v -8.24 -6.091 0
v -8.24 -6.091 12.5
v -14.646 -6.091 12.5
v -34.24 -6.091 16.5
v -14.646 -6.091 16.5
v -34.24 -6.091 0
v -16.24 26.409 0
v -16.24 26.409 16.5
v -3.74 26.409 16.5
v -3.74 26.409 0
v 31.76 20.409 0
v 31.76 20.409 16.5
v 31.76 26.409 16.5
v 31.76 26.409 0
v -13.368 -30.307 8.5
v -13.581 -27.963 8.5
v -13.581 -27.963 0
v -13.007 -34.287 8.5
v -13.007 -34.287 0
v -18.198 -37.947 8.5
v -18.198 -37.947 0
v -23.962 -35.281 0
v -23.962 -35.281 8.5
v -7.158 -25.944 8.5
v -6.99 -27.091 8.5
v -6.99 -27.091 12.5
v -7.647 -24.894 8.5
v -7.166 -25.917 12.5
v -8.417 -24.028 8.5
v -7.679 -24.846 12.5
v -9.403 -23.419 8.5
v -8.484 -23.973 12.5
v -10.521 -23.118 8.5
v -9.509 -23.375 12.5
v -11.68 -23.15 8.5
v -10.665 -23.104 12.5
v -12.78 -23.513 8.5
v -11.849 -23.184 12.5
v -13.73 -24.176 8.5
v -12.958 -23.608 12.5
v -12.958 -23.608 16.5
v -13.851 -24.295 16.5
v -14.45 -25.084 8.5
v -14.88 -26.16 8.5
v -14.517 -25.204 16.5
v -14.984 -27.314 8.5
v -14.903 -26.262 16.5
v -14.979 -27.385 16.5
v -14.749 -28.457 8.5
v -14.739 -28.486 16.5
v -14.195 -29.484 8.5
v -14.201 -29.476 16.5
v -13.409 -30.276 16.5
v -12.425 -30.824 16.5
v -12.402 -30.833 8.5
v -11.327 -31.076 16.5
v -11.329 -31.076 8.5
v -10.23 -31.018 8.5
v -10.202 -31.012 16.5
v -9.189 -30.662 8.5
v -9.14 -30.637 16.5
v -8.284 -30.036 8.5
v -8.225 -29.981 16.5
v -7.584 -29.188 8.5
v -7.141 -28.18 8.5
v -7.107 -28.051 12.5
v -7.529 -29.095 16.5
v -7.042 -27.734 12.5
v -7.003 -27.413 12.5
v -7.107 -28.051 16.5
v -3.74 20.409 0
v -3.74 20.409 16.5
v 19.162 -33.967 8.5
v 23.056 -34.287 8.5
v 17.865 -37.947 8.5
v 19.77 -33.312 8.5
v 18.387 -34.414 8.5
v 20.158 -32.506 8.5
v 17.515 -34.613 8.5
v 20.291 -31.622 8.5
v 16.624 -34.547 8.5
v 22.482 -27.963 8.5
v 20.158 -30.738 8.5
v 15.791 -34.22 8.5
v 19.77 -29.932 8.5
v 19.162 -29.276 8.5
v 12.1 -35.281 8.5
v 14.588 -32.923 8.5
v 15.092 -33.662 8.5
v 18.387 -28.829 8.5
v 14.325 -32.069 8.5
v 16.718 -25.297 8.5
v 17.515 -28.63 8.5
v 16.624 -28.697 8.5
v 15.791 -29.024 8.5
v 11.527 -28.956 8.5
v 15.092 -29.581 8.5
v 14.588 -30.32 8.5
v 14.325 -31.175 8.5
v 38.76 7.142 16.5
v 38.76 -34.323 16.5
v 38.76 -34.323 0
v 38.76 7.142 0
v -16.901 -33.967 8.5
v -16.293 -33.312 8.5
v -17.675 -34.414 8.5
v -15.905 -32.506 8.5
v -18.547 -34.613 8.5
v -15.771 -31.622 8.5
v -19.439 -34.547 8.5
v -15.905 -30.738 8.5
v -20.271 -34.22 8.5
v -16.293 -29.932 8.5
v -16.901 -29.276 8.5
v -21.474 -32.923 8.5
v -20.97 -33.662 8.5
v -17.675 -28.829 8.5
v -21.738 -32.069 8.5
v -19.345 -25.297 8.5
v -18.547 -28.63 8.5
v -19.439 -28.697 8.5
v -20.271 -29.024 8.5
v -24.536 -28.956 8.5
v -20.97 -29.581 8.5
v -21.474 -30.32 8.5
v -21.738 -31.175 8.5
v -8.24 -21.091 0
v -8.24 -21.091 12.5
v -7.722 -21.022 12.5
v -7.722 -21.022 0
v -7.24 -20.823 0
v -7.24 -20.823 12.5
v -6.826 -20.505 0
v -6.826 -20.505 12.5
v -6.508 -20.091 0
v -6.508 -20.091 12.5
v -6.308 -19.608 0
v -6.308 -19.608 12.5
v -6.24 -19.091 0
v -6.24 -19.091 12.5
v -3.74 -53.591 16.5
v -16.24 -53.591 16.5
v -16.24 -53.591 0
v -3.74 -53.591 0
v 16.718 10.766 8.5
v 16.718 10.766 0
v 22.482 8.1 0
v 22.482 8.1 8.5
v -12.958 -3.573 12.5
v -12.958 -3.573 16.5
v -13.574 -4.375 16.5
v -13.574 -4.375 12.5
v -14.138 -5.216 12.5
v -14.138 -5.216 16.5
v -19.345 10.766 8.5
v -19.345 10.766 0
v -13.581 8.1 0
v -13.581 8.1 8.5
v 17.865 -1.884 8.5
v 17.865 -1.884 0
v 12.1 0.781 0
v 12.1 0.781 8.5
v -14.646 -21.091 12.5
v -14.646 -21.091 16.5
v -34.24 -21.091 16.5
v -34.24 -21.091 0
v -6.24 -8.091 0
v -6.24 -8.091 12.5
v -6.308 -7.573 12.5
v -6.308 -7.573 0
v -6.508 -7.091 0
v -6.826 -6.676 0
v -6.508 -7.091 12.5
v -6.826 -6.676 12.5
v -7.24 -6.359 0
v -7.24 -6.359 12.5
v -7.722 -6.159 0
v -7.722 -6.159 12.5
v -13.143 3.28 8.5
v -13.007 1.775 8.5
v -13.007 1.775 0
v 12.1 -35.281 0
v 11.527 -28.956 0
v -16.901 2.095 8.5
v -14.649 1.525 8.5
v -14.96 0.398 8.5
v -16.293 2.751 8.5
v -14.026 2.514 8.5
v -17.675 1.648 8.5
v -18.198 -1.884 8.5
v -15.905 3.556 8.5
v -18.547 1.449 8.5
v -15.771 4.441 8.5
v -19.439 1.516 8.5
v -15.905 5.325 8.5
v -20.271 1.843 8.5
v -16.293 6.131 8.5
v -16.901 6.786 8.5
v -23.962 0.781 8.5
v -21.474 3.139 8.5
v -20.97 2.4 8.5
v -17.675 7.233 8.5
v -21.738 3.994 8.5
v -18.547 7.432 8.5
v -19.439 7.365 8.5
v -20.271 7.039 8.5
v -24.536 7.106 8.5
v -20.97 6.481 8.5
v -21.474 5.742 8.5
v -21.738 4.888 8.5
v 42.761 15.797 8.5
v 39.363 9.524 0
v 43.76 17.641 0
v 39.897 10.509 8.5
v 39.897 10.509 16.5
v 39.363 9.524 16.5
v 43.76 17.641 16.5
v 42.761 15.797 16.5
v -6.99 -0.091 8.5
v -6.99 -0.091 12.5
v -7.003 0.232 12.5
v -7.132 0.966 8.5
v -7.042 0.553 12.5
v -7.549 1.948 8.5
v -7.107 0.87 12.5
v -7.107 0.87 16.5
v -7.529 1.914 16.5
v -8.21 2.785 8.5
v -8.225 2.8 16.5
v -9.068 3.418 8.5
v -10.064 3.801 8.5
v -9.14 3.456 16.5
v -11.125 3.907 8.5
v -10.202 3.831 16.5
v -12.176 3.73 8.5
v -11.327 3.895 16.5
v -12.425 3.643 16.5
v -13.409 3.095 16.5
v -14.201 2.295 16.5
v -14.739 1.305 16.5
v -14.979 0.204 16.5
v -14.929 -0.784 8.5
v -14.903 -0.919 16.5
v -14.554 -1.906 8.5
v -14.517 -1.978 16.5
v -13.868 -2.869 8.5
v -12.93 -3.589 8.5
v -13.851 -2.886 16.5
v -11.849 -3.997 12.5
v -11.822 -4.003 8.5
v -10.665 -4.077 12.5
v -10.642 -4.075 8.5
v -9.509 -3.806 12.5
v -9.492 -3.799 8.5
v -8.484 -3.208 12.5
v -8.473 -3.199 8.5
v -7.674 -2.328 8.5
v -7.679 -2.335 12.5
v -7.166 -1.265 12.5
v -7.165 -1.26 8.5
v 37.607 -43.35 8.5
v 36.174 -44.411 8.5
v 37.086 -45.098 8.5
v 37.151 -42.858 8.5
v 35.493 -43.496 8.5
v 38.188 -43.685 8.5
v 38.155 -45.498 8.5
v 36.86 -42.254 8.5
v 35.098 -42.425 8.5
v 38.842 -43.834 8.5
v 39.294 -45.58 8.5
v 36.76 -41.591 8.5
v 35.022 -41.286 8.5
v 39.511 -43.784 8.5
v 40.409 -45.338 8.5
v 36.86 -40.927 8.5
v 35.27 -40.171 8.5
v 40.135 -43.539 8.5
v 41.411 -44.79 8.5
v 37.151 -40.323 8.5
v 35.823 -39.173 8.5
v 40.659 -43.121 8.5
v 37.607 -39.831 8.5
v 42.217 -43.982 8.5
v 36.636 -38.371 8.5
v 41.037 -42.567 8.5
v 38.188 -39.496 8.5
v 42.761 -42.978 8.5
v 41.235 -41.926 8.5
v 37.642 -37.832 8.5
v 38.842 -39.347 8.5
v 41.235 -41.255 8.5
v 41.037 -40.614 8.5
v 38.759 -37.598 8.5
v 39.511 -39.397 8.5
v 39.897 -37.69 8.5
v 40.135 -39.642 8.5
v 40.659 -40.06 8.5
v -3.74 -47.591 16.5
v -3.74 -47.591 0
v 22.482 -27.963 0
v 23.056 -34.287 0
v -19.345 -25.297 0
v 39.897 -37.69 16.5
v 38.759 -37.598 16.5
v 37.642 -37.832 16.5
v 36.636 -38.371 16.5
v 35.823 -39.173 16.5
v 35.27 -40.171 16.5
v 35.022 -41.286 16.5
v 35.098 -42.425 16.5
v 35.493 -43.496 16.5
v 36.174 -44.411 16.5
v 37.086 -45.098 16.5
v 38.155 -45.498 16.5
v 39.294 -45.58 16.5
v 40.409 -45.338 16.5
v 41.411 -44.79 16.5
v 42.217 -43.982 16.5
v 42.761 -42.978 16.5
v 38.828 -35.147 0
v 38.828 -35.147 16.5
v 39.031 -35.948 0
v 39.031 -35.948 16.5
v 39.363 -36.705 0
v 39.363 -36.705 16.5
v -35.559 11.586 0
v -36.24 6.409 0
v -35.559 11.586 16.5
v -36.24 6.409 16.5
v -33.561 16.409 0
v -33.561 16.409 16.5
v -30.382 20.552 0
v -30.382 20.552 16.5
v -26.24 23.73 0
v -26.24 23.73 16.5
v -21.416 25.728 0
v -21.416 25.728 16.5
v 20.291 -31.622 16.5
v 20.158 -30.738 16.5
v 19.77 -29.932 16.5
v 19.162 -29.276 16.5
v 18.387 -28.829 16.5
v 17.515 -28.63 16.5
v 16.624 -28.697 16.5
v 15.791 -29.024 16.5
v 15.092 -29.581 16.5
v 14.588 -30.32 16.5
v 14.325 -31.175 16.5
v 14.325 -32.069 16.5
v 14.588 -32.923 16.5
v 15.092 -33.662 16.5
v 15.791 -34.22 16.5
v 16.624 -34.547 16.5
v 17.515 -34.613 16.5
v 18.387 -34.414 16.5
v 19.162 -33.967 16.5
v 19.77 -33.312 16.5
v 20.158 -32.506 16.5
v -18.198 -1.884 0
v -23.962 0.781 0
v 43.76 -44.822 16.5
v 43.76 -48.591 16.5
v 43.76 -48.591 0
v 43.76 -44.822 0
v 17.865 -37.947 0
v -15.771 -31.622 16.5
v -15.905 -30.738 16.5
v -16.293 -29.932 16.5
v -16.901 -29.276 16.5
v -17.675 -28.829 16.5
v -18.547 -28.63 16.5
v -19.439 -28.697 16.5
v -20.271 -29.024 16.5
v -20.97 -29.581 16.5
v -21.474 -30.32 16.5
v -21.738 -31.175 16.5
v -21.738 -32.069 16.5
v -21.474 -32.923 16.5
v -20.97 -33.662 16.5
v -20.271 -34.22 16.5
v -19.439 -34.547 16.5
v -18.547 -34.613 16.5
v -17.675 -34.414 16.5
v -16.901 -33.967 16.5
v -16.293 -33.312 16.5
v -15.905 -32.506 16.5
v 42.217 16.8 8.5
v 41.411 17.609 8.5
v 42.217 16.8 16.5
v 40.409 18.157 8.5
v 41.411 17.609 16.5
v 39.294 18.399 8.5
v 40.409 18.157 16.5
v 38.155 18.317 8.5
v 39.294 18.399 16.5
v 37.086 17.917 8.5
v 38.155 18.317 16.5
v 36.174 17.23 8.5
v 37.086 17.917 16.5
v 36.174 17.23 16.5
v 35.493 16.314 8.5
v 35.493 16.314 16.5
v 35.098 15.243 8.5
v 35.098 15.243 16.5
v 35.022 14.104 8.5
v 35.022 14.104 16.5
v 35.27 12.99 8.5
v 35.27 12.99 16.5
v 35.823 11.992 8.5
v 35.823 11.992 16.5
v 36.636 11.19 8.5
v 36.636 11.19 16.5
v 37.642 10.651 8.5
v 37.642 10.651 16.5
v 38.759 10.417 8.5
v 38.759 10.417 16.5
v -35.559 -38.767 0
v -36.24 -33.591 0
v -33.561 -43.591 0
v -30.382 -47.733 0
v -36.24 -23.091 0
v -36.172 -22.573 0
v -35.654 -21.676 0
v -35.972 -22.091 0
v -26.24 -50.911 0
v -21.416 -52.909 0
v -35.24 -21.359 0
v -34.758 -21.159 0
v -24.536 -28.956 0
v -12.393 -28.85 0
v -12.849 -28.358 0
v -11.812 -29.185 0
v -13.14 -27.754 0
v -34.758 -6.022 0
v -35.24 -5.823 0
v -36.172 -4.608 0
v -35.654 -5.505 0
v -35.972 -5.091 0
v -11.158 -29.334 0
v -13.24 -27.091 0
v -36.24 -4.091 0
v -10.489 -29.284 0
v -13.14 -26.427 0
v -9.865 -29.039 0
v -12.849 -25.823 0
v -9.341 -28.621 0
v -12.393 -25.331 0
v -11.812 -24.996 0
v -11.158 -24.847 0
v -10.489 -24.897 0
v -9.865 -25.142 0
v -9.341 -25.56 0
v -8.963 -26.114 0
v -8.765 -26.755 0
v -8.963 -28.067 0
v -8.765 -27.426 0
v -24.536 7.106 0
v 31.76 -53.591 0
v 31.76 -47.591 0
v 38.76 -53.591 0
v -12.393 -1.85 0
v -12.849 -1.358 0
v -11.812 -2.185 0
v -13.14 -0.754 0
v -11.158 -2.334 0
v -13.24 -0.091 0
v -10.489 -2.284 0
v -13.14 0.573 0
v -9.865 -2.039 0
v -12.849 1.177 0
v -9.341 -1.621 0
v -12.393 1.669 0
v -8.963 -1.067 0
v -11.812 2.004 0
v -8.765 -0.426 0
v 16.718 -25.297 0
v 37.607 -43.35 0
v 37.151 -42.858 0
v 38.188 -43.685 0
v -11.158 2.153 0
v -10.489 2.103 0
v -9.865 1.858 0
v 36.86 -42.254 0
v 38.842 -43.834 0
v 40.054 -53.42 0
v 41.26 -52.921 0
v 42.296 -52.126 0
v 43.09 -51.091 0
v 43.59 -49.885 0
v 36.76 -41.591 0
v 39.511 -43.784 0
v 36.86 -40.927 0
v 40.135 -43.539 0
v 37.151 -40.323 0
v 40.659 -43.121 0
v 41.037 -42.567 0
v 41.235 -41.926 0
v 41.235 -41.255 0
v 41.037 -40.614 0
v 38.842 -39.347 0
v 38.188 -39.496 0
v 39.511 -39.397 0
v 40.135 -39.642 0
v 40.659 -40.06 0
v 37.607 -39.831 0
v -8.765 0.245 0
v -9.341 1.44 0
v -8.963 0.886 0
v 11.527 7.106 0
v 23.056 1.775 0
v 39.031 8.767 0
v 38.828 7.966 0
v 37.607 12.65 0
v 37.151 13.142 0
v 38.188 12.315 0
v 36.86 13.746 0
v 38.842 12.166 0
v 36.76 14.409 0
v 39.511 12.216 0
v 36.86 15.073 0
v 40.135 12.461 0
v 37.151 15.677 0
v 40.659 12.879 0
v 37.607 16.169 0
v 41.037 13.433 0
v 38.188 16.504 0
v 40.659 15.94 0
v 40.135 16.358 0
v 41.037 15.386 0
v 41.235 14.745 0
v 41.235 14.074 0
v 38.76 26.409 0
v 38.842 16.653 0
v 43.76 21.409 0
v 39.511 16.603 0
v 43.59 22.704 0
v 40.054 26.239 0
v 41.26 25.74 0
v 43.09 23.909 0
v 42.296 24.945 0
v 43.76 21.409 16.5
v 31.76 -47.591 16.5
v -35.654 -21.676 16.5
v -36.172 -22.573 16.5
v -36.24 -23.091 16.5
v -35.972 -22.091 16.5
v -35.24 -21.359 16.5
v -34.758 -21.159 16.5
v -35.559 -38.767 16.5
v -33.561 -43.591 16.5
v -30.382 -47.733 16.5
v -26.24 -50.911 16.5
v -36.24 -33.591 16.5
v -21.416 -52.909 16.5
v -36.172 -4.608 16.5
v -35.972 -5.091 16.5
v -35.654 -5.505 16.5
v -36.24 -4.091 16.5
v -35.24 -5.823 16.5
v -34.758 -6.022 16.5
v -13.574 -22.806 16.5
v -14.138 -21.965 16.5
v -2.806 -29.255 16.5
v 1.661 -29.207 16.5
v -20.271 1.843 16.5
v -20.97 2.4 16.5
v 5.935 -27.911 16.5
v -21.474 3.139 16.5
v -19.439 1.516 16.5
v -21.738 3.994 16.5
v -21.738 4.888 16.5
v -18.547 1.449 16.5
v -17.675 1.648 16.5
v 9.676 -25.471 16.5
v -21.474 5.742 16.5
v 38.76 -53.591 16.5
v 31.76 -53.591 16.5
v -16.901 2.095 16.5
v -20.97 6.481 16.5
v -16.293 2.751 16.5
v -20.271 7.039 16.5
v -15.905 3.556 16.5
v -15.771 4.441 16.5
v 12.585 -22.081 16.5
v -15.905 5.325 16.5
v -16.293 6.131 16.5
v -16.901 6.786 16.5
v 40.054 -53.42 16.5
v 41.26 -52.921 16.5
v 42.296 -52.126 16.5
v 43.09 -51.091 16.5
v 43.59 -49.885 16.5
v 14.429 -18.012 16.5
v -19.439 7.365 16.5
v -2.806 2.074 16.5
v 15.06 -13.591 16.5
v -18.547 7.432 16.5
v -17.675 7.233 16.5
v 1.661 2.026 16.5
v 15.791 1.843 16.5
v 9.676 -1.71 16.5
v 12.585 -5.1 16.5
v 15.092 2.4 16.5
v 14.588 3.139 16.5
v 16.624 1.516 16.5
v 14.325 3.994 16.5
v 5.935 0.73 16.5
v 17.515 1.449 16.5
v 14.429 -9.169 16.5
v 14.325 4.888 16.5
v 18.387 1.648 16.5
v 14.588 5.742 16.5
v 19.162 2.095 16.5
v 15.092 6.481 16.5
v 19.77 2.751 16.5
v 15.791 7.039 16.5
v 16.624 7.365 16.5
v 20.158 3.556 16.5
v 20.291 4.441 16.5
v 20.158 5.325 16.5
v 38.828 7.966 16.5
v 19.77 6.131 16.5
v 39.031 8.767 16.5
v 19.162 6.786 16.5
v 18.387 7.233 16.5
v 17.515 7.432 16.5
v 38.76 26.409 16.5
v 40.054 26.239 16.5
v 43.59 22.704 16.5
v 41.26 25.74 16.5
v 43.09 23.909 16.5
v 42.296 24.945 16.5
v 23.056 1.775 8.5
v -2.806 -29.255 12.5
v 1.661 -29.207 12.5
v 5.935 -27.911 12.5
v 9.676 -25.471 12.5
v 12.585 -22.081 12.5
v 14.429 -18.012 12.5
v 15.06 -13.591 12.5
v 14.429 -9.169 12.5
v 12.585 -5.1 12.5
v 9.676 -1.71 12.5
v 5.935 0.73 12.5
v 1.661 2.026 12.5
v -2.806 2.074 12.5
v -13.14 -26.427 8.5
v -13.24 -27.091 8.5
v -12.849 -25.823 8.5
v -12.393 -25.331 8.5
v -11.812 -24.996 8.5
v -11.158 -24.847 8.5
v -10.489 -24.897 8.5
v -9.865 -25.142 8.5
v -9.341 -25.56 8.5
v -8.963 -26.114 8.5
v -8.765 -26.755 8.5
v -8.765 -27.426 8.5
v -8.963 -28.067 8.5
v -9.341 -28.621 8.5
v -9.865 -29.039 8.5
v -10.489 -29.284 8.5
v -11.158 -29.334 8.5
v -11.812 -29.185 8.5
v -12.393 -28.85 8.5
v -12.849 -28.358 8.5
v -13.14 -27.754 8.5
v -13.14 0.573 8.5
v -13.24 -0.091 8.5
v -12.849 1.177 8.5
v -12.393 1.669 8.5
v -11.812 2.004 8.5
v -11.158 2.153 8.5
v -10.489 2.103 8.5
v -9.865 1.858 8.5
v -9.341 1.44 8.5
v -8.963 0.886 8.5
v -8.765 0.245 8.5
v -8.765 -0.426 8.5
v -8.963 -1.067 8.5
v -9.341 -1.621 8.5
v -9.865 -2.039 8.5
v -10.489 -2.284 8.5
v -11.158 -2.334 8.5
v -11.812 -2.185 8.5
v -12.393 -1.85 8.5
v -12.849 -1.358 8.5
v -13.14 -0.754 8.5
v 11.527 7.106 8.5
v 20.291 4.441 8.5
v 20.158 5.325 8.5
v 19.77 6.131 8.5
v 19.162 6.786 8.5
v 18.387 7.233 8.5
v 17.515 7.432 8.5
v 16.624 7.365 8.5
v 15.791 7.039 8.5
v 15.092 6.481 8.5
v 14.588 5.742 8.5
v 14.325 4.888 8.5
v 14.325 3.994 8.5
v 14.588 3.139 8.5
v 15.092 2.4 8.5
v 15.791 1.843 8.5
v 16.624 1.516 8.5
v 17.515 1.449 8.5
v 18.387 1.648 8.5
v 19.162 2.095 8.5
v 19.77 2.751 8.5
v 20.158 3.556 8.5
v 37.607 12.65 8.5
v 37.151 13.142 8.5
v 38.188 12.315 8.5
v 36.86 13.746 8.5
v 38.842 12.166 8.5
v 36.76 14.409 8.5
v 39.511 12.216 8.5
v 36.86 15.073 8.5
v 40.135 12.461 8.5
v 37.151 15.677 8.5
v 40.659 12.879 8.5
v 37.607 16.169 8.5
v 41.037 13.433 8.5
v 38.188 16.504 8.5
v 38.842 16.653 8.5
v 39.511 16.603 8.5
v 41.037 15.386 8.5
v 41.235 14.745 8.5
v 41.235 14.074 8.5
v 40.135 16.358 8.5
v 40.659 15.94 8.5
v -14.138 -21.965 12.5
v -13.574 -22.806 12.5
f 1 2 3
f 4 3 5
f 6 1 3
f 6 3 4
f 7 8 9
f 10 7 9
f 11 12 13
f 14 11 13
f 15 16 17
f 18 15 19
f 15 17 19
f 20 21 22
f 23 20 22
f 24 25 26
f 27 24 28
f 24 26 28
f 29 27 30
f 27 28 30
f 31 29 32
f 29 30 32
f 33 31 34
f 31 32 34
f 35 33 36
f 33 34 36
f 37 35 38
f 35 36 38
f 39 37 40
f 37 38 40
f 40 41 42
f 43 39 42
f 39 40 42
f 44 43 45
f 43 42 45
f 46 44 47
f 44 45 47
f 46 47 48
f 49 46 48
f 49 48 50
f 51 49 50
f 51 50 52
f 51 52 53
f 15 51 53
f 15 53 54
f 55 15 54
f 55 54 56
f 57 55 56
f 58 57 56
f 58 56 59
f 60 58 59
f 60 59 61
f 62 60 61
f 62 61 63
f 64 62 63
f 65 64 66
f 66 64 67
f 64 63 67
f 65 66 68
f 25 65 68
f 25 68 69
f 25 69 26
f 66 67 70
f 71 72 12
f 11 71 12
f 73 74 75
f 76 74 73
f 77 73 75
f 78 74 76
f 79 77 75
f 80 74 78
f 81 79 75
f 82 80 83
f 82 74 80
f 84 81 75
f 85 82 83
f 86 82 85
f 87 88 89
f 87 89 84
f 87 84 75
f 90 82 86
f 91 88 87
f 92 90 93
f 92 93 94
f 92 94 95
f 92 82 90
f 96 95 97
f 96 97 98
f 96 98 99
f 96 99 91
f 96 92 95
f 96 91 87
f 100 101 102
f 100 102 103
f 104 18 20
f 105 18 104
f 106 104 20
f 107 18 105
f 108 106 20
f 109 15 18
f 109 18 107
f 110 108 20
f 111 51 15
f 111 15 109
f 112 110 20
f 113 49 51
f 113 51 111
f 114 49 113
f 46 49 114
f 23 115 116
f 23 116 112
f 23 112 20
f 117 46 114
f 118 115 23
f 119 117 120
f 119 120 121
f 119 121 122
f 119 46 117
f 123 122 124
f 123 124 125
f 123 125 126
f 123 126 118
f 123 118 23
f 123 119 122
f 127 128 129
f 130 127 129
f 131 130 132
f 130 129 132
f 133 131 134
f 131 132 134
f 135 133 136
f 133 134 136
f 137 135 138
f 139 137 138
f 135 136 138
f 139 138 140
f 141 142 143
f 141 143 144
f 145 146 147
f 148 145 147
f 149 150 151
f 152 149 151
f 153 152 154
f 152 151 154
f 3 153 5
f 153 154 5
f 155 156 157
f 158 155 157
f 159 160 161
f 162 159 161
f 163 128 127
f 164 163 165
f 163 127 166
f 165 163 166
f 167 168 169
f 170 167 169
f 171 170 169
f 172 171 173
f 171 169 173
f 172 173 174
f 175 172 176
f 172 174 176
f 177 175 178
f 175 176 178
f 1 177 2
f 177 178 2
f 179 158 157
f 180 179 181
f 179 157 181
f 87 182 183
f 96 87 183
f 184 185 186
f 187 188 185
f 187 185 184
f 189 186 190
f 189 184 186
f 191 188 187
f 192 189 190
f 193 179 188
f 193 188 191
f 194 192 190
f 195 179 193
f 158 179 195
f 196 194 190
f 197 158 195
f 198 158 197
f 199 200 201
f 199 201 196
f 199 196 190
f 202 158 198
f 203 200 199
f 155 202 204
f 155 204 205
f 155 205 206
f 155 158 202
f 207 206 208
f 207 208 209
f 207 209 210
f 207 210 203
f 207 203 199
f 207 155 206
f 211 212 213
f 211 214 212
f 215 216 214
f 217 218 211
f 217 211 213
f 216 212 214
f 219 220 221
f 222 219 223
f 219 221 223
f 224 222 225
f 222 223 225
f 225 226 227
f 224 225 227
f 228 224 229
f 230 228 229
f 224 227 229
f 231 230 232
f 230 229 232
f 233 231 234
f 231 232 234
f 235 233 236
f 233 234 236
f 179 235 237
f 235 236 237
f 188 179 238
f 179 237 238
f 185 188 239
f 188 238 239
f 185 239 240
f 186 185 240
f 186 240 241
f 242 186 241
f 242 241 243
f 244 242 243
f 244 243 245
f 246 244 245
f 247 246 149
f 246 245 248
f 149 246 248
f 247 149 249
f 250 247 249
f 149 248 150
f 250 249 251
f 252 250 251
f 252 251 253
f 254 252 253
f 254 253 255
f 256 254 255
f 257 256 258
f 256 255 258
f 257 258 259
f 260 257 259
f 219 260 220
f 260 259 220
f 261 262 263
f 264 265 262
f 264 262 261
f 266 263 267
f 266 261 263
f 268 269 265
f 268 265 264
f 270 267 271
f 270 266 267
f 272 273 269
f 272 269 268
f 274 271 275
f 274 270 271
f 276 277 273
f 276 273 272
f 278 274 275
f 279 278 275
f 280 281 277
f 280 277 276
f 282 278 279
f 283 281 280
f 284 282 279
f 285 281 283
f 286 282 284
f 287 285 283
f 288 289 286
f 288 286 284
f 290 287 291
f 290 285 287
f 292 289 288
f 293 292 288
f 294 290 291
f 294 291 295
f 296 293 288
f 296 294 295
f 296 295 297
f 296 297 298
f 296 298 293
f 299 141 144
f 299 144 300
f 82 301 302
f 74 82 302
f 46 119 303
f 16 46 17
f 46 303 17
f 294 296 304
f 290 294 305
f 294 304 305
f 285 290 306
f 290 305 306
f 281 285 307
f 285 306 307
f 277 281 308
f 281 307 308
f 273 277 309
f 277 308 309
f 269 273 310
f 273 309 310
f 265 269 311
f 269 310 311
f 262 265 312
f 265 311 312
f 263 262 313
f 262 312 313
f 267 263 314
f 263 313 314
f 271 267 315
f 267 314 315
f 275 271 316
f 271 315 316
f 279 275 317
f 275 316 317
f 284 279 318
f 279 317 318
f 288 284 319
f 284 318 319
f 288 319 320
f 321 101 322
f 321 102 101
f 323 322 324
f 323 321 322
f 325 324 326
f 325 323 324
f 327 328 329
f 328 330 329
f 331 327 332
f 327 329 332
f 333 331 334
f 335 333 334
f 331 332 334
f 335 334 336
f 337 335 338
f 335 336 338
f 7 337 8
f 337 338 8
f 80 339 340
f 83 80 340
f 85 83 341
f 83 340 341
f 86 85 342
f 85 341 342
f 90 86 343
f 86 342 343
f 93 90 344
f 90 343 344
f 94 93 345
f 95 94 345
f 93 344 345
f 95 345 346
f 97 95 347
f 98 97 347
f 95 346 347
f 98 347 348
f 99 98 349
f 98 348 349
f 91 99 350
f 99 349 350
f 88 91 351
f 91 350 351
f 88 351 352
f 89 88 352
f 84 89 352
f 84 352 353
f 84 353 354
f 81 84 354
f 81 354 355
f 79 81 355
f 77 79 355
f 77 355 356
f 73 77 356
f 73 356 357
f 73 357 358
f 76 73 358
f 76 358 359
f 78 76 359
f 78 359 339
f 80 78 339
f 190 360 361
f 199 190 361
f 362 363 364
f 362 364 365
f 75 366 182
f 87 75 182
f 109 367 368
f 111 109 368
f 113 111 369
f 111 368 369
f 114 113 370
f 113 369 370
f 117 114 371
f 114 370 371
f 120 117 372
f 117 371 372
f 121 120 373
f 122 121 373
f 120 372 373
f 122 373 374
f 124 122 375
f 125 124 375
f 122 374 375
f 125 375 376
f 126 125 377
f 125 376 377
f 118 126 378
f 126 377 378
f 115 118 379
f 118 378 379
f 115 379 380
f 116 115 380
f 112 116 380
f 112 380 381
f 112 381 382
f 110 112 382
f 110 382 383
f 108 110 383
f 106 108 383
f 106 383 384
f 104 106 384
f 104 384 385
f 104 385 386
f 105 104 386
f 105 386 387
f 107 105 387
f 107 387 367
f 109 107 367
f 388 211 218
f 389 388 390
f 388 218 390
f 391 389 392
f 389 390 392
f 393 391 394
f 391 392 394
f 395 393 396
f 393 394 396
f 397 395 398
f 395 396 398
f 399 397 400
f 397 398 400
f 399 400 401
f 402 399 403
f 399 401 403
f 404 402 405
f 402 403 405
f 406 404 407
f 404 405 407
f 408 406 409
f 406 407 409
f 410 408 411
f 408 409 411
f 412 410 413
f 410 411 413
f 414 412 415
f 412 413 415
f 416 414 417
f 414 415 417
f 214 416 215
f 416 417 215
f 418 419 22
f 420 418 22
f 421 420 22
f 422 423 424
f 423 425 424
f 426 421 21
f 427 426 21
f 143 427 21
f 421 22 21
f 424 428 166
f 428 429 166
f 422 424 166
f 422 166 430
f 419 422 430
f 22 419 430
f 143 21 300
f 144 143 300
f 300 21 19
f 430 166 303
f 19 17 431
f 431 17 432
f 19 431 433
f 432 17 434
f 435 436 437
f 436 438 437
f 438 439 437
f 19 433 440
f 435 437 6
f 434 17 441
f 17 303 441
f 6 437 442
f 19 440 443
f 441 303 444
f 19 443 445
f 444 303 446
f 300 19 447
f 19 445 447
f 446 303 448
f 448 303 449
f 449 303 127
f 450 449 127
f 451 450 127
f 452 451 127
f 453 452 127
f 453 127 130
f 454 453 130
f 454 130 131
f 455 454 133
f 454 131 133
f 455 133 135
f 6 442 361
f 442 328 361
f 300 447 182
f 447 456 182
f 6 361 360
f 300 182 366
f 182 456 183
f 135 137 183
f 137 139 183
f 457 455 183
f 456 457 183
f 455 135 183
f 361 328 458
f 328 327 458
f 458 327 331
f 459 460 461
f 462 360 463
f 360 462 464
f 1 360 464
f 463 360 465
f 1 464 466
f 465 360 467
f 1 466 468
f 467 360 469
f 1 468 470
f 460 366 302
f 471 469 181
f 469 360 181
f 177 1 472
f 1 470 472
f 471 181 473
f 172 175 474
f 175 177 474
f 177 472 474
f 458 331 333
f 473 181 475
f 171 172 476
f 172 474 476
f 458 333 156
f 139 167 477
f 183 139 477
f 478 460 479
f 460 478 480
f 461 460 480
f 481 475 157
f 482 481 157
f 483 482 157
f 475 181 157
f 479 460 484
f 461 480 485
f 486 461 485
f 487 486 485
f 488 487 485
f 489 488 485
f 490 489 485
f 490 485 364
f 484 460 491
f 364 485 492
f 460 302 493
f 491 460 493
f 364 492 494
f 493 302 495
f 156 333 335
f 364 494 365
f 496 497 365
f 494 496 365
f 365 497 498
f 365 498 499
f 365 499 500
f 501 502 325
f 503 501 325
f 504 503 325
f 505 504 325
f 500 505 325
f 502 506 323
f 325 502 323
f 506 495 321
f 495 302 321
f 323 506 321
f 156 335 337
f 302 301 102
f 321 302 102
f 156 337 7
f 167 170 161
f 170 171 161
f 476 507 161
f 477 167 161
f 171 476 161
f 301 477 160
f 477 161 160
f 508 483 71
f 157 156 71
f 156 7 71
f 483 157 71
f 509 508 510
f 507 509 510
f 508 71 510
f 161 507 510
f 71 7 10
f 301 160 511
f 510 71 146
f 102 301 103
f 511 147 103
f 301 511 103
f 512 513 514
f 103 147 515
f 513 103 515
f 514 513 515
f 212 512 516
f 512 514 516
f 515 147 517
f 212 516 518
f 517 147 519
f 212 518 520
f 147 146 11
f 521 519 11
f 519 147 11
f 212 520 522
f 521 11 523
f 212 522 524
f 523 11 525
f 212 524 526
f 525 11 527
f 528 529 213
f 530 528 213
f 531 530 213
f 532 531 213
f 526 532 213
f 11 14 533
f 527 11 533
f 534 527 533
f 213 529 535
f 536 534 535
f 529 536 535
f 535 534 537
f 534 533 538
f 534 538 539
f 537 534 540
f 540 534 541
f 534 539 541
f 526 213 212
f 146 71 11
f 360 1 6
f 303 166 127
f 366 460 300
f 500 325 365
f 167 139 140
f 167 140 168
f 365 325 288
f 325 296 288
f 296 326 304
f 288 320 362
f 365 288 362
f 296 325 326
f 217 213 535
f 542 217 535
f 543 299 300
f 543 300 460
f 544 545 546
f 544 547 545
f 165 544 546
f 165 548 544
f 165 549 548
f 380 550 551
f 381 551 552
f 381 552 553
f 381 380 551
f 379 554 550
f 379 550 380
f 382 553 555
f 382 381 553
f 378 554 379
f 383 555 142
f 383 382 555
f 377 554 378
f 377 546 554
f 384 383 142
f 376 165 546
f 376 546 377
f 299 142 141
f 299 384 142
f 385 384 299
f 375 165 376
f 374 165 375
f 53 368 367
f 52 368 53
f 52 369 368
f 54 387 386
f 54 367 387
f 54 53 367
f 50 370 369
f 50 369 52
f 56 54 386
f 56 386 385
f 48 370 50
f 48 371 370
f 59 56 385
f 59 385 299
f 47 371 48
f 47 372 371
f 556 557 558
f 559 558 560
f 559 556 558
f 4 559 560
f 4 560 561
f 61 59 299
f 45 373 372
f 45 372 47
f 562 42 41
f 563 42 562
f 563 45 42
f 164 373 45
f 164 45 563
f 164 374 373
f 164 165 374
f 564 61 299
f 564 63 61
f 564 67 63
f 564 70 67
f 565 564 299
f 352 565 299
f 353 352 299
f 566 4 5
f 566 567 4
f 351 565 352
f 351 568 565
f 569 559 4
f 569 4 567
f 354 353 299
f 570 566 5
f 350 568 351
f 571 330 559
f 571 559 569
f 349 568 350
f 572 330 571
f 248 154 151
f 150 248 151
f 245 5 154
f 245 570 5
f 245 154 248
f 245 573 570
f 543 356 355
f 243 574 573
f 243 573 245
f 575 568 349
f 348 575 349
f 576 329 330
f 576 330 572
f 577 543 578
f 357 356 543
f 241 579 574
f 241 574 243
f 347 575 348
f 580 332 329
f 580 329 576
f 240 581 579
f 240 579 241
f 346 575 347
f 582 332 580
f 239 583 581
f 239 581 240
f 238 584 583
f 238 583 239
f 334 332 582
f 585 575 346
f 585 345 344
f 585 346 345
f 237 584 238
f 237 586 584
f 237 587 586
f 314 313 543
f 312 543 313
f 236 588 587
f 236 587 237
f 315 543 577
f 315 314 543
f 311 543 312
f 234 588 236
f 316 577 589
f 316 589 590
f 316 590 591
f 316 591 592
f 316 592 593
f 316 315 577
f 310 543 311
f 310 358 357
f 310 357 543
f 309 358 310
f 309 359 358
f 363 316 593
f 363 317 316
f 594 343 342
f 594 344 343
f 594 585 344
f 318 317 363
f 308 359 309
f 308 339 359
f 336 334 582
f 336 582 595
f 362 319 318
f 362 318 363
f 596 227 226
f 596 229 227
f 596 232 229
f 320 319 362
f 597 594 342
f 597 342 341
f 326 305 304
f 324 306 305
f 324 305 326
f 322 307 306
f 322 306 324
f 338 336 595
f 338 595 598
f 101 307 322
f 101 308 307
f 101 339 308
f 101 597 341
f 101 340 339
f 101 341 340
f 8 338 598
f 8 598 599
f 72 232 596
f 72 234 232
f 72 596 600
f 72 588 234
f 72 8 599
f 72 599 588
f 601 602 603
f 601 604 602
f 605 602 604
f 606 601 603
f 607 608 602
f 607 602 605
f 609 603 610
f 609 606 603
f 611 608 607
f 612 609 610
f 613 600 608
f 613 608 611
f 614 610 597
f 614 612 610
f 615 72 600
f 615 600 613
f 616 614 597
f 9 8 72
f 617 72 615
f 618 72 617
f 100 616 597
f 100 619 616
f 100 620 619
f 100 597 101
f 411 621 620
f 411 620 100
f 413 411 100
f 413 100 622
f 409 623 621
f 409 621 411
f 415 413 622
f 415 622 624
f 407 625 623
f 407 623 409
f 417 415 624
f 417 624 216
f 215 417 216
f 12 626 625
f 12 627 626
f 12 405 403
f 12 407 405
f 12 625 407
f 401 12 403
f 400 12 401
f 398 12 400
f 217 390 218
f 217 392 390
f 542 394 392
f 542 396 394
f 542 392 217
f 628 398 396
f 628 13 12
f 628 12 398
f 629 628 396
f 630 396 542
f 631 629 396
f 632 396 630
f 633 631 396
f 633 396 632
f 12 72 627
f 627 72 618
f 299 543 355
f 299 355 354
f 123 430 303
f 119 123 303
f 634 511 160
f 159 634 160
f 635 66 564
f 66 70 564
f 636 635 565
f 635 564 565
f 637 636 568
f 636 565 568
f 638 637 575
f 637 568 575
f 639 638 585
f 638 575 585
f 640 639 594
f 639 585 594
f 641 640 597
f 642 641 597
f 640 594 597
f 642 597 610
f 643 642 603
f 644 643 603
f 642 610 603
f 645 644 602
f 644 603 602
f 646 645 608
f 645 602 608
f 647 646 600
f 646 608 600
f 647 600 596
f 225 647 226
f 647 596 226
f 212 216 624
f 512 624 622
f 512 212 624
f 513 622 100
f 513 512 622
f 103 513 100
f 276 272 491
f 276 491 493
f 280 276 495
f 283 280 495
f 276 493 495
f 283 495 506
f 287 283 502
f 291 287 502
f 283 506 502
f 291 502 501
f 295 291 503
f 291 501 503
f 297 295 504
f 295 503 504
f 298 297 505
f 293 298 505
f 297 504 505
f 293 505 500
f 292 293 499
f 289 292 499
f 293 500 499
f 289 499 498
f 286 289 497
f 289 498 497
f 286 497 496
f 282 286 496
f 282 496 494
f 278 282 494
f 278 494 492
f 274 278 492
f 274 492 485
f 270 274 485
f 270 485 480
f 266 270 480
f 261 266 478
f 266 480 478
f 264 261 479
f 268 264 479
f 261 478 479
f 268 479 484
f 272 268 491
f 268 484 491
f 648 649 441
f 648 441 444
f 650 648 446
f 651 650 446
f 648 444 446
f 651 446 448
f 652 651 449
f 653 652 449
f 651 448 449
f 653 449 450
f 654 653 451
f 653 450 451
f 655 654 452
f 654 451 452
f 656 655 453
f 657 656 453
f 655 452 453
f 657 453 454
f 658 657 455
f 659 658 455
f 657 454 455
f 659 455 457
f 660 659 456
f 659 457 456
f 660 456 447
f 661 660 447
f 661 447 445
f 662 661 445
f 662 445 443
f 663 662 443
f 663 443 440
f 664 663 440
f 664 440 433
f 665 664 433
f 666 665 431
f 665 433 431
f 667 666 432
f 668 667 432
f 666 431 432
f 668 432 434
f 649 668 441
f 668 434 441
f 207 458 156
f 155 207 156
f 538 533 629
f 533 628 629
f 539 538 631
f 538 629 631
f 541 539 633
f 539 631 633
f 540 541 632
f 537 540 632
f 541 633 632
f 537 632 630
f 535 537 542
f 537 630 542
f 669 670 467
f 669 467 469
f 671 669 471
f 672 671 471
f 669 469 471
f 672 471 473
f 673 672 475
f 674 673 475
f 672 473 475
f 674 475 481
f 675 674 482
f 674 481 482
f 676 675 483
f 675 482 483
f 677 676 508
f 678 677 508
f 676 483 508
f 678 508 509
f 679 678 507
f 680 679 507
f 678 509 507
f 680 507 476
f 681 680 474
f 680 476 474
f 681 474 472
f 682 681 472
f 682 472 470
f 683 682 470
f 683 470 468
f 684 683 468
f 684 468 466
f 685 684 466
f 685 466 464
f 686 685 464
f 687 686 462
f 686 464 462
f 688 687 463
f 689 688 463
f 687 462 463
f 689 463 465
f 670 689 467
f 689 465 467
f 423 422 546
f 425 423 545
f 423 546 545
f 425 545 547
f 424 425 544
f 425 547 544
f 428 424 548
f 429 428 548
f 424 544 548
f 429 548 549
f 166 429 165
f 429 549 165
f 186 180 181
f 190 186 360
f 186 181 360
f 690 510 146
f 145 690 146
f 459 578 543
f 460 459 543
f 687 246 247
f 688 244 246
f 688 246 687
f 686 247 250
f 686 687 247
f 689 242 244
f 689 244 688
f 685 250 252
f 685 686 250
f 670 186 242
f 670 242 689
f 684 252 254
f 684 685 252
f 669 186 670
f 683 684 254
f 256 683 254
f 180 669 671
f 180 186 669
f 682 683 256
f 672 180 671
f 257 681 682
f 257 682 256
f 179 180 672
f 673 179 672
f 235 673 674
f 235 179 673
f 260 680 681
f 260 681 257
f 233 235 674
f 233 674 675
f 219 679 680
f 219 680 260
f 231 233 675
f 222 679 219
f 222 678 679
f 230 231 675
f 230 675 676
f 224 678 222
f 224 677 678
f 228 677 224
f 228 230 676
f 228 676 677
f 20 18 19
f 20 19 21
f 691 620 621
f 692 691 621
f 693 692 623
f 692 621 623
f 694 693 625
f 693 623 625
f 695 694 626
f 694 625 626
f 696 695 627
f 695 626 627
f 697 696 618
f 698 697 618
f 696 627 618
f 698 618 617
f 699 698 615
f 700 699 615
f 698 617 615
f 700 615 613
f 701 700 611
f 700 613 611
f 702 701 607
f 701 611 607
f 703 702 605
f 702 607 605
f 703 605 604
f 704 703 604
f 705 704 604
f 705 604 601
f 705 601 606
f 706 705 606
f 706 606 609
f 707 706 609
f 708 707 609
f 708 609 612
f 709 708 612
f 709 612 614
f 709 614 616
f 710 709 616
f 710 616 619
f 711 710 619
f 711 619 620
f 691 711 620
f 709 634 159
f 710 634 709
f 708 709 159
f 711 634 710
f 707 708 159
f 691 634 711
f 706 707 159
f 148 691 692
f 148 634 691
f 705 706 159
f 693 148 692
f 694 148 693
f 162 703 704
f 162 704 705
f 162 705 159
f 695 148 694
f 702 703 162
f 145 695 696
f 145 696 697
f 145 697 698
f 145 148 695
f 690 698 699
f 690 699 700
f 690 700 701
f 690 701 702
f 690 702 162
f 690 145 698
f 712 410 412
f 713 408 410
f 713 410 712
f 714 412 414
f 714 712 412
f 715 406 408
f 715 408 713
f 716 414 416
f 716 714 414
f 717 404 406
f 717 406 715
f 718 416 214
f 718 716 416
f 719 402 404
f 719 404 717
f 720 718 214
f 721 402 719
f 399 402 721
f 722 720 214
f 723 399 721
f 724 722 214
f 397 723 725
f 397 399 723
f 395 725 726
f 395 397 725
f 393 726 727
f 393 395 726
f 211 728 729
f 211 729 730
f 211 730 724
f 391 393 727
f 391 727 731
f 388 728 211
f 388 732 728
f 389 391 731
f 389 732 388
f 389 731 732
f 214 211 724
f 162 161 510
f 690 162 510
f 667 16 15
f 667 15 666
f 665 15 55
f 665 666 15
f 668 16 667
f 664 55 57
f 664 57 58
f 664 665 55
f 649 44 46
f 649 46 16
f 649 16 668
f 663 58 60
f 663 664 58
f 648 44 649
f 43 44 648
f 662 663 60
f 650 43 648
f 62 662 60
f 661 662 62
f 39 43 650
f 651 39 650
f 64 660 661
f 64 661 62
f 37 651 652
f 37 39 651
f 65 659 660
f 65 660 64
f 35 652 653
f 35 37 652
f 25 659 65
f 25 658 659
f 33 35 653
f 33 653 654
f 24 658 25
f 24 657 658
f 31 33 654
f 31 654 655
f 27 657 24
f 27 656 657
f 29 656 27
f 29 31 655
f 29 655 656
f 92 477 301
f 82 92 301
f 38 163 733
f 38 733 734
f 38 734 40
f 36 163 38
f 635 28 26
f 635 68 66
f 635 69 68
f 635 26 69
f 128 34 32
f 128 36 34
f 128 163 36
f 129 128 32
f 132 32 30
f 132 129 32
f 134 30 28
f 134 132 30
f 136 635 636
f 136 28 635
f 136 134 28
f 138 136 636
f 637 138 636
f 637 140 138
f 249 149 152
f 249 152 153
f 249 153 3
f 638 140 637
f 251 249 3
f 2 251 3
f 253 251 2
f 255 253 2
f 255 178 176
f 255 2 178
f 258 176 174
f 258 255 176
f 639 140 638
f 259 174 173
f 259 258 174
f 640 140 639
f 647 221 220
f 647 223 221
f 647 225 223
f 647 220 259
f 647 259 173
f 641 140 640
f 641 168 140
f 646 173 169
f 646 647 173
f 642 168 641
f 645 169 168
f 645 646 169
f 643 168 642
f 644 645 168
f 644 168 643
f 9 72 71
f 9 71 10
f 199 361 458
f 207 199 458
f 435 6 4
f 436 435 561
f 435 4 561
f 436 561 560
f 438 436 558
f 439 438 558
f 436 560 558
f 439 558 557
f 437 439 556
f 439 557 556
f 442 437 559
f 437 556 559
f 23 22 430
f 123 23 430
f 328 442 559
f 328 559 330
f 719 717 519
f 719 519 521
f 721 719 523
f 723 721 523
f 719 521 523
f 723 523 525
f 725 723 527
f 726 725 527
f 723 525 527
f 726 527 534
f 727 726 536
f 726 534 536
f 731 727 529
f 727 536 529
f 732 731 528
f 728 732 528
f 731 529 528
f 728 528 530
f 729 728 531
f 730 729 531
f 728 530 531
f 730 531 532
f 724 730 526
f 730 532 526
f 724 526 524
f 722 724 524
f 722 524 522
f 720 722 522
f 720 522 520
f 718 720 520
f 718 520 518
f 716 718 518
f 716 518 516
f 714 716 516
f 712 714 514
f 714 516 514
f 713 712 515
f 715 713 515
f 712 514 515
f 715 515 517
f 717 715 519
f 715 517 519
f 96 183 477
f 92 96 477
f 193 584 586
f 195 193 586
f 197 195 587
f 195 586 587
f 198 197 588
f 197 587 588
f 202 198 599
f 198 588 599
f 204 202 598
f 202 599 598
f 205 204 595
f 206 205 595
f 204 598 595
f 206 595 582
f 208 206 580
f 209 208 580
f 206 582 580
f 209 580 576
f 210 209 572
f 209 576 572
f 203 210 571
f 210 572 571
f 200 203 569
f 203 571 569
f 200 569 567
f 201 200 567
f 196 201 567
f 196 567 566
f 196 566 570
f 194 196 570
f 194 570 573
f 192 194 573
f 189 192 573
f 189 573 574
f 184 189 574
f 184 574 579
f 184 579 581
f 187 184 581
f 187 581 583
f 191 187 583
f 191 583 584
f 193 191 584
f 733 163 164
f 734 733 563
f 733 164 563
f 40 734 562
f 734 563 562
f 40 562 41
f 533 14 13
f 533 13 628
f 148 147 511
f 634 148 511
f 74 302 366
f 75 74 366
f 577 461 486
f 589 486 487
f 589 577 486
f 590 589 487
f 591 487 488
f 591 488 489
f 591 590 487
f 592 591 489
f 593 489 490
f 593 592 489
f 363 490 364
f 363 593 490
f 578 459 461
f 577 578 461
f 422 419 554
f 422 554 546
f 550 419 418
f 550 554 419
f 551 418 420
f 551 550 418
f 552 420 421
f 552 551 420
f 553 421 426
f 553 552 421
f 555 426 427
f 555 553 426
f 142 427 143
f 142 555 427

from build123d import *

# Parameters (mm, degrees)
SKETCH_1_W                = 80
SKETCH_1_H                = 80
EXTRUDE_1_DEPTH           = 16.5
FILLET_1_R                = 20
FILLET_2_R                = 5
SKETCH_2_W                = 30
SKETCH_2_H                = 15
CUT_EXTRUDE_1_DEPTH       = 72.127592652
FILLET_3_R                = 2
SKETCH_3_W                = 35.5
SKETCH_3_H                = 6
CUT_EXTRUDE_2_DEPTH       = 72.127592652
SKETCH_4_W                = 35.5
SKETCH_4_H                = 6
CUT_EXTRUDE_3_DEPTH       = 72.127592652
SKETCH_5_W                = 5
SKETCH_5_H                = 44
CUT_EXTRUDE_4_DEPTH       = 72.127592652
HOLE_WIZARD_3_D           = 4.5
HOLE_WIZARD_3_CBORE_D     = 8
HOLE_WIZARD_3_CBORE_DEPTH = 4.6
SKETCH_10_R               = 15.8
CUT_EXTRUDE_5_DEPTH       = 4
SKETCH_18_R               = 4
CUT_EXTRUDE_7_DEPTH       = 8
CUT_EXTRUDE_9_DEPTH       = 72.127592652
FILLET_4_R                = 5
SKETCH_11_R               = 3
CUT_EXTRUDE_10_DEPTH      = 72.127592652
CUT_EXTRUDE_11_DEPTH      = 8.5


with BuildPart() as part:
    # 草图1 → 凸台-拉伸1 (new body)
    with BuildSketch(Plane.XY):
        with Locations((3.759980536, -13.590563907)):
            Rectangle(SKETCH_1_W, SKETCH_1_H)
    extrude(amount=EXTRUDE_1_DEPTH)

    # 圆角1
    fillet_1_edges = [part.edges().sort_by_distance(p)[0] for p in [
        (-36.240019464, 26.409436093, 8.25),
        (-36.240019464, -53.590563907, 8.25),
    ]]
    fillet(fillet_1_edges, radius=FILLET_1_R)

    # 圆角2
    fillet_2_edges = [part.edges().sort_by_distance(p)[0] for p in [
        (43.759980536, 26.409436093, 8.25),
        (43.759980536, -53.590563907, 8.25),
    ]]
    fillet(fillet_2_edges, radius=FILLET_2_R)

    # 草图2 → 切除-拉伸1 (cut, through all)
    with BuildSketch(Plane(origin=(0, 0, 0), x_dir=(-1, 0, 0), z_dir=(0, 0, -1))):
        with Locations((21.240019464, -13.590563907)):
            Rectangle(SKETCH_2_W, SKETCH_2_H)
    extrude(amount=-CUT_EXTRUDE_1_DEPTH, mode=Mode.SUBTRACT)

    # 圆角3
    fillet_3_edges = [part.edges().sort_by_distance(p)[0] for p in [
        (-36.240019464, -6.090563907, 8.25),
        (-36.240019464, -21.090563907, 8.25),
        (-6.240019464, -21.090563907, 8.25),
        (-6.240019464, -6.090563907, 8.25),
    ]]
    fillet(fillet_3_edges, radius=FILLET_3_R)

    # 草图3 → 切除-拉伸2 (cut, through all)
    with BuildSketch(Plane.XY.offset(16.5)):
        with Locations((14.009980536, 23.409436093)):
            Rectangle(SKETCH_3_W, SKETCH_3_H)
    extrude(amount=-CUT_EXTRUDE_2_DEPTH, mode=Mode.SUBTRACT)

    # 草图4 → 切除-拉伸3 (cut, through all)
    with BuildSketch(Plane.XY.offset(16.5)):
        with Locations((14.009980536, -50.590563907)):
            Rectangle(SKETCH_4_W, SKETCH_4_H)
    extrude(amount=-CUT_EXTRUDE_3_DEPTH, mode=Mode.SUBTRACT)

    # 草图5 → 切除-拉伸4 (cut, through all)
    with BuildSketch(Plane.XY.offset(16.5)):
        with Locations((41.259980536, -13.590563907)):
            Rectangle(SKETCH_5_W, SKETCH_5_H)
    extrude(amount=-CUT_EXTRUDE_4_DEPTH, mode=Mode.SUBTRACT)

    # 打孔尺寸(%根据)内六角圆柱头螺钉的类型3 (through all)
    with Locations(Plane.XY.offset(16.5)):
        with Locations((-10.990019464, -0.090563907), (-10.990019464, -27.090563907), (39.009980536, 14.409436093), (39.009980536, -41.590563907)):
            CounterBoreHole(HOLE_WIZARD_3_D / 2, HOLE_WIZARD_3_CBORE_D / 2, HOLE_WIZARD_3_CBORE_DEPTH)

    # 草图10 → 切除-拉伸5 (cut)
    with BuildSketch(Plane.XY.offset(16.5)):
        with Locations((-0.740019464, -13.590563907)):
            Circle(SKETCH_10_R)
    extrude(amount=-CUT_EXTRUDE_5_DEPTH, mode=Mode.SUBTRACT)

    # 草图18 → 切除-拉伸7 (cut)
    with BuildSketch(Plane.XY.offset(16.5)):
        with Locations((-10.990019464, -0.090563907)):
            Circle(SKETCH_18_R)
        with Locations((-10.990019464, -27.090563907)):
            Circle(SKETCH_18_R)
        with Locations((39.009980536, -41.590563907)):
            Circle(SKETCH_18_R)
        with Locations((39.009980536, 14.409436093)):
            Circle(SKETCH_18_R)
    extrude(amount=-CUT_EXTRUDE_7_DEPTH, mode=Mode.SUBTRACT)

    # 草图21 → 切除-拉伸9 (cut, through all)
    with BuildSketch(Plane.XY.offset(16.5)):
        Polygon((38.759980536, 8.409436093), (43.759980536, 17.640880354), (43.759980536, 8.409436093), align=None)
        Polygon((43.759980536, -35.590563907), (38.759980536, -35.590563907), (43.759980536, -44.822008169), align=None)
    extrude(amount=-CUT_EXTRUDE_9_DEPTH, mode=Mode.SUBTRACT)

    # 圆角4
    fillet_4_edges = [part.edges().sort_by_distance(p)[0] for p in [
        (38.759980536, -35.590563907, 8.25),
        (38.759980536, 8.409436093, 8.25),
    ]]
    fillet(fillet_4_edges, radius=FILLET_4_R)

    # 草图11 → 切除-拉伸10 (cut, through all)
    with BuildSketch(Plane.XY.offset(16.5)):
        with Locations((-18.771242384, 4.440659013)):
            Circle(SKETCH_11_R)
        with Locations((17.291203456, 4.440659013)):
            Circle(SKETCH_11_R)
        with Locations((17.291203456, -31.621786828)):
            Circle(SKETCH_11_R)
        with Locations((-18.771242384, -31.621786828)):
            Circle(SKETCH_11_R)
    extrude(amount=-CUT_EXTRUDE_10_DEPTH, mode=Mode.SUBTRACT)

    # 草图22 → 切除-拉伸11 (cut)
    with BuildSketch(Plane(origin=(0, 0, 0), x_dir=(-1, 0, 0), z_dir=(0, 0, -1))):
        Polygon((-16.717600761, 10.765555319), (-22.481922986, 8.099861672), (-23.055525681, 1.774965366), (-17.864806152, -1.884237293), (-12.100483927, 0.781456354), (-11.526881231, 7.10635266), align=None)
        Polygon((-11.526881231, -28.956093181), (-16.717600761, -25.296890522), (-22.481922986, -27.962584169), (-23.055525681, -34.287480475), (-17.864806152, -37.946683134), (-12.100483927, -35.280989487), align=None)
        Polygon((24.535564609, 7.10635266), (19.34484508, 10.765555319), (13.580522855, 8.099861672), (13.006920159, 1.774965366), (18.197639689, -1.884237293), (23.961961914, 0.781456354), align=None)
        Polygon((18.197639689, -37.946683134), (23.961961914, -35.280989487), (24.535564609, -28.956093181), (19.34484508, -25.296890522), (13.580522855, -27.962584169), (13.006920159, -34.287480475), align=None)
    extrude(amount=-CUT_EXTRUDE_11_DEPTH, mode=Mode.SUBTRACT)


solid = part.part
